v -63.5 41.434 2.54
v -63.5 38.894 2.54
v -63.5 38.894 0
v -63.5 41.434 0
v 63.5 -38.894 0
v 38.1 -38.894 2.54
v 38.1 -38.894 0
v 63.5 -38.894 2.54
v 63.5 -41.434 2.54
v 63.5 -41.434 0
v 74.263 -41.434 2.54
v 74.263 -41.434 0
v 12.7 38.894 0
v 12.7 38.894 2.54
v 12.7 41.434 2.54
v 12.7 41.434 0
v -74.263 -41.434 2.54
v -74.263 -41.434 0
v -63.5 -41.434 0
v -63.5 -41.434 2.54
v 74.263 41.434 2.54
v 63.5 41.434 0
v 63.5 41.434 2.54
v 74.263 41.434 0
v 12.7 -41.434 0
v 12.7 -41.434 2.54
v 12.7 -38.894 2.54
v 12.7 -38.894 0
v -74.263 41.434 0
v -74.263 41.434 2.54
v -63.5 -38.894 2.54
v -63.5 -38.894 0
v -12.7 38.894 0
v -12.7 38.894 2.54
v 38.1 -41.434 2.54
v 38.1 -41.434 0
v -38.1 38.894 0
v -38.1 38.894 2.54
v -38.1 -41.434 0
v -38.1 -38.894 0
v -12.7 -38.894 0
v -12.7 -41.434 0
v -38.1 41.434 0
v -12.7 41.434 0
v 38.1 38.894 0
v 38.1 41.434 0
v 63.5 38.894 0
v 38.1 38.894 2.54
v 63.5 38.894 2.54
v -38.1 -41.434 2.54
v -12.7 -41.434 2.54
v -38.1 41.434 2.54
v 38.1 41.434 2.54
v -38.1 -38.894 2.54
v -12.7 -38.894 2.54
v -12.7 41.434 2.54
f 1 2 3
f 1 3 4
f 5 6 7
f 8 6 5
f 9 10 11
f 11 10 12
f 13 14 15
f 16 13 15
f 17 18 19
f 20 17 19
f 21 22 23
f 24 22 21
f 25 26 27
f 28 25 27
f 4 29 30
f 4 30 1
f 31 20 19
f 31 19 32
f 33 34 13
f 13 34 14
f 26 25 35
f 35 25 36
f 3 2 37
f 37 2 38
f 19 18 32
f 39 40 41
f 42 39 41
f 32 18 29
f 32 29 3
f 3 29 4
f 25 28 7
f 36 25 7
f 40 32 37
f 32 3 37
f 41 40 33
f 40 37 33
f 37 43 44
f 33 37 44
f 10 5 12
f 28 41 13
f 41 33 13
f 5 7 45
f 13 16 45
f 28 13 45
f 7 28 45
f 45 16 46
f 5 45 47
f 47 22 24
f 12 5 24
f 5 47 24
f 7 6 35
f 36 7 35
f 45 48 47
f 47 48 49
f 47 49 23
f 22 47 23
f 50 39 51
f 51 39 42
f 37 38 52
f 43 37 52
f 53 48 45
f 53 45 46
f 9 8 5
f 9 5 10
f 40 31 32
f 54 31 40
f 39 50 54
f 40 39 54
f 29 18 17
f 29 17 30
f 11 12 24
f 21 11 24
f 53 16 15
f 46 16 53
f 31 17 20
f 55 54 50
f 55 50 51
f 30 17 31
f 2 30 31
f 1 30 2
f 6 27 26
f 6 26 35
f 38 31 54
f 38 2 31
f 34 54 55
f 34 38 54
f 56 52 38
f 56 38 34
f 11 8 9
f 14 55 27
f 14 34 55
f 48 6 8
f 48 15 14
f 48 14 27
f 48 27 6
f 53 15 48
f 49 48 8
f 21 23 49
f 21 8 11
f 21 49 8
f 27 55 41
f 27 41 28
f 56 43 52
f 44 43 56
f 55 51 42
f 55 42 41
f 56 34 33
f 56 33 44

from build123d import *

# Parameters (mm, degrees)
SKETCH1_W               = 148.5265
SKETCH1_H               = 82.8675
BOSS_EXTRUDE1_DEPTH     = 2.54
SKETCH2_W               = 25.4
SKETCH2_H               = 2.54
CUT_EXTRUDE1_DEPTH      = 86.077832246
LPATTERN1_COUNT         = 3
LPATTERN1_PITCH         = 50.8
MIRROR1_COPY_1_SKETCH_W = 25.4
MIRROR1_COPY_1_SKETCH_H = 2.54
MIRROR1_COPY_1_DEPTH    = 86.077832246
MIRROR1_COPY_2_SKETCH_W = 25.4
MIRROR1_COPY_2_SKETCH_H = 2.54
MIRROR1_COPY_2_DEPTH    = 86.077832246


with BuildPart() as part:
    # Sketch1 → Boss-Extrude1 (new body)
    with BuildSketch(Plane.XY):
        Rectangle(SKETCH1_W, SKETCH1_H)
    extrude(amount=BOSS_EXTRUDE1_DEPTH)

    # Sketch2 → Cut-Extrude1 (cut, through all)
    with BuildSketch(Plane.XY.offset(2.54)):
        with Locations((50.8, 40.16375)):
            Rectangle(SKETCH2_W, SKETCH2_H)
    cut_extrude1 = extrude(amount=-CUT_EXTRUDE1_DEPTH, mode=Mode.SUBTRACT)

    # LPattern1: Cut-Extrude1 ×3
    with Locations(*[(-i * LPATTERN1_PITCH, 0, 0) for i in range(1, LPATTERN1_COUNT)]):
        add(cut_extrude1, mode=Mode.SUBTRACT)

    # Mirror1: Cut-Extrude1 across plane
    add(cut_extrude1.mirror(Plane.ZX), mode=Mode.SUBTRACT)

    # Mirror1 copy 1 sketch → Mirror1 copy 1 (cut, through all)
    with BuildSketch(Plane(origin=(-50.8, 0, 2.54), x_dir=(1, 0, 0), z_dir=(0, 0, 1))):
        with Locations((50.8, -40.16375)):
            Rectangle(MIRROR1_COPY_1_SKETCH_W, MIRROR1_COPY_1_SKETCH_H)
    extrude(amount=-MIRROR1_COPY_1_DEPTH, mode=Mode.SUBTRACT)

    # Mirror1 copy 2 sketch → Mirror1 copy 2 (cut, through all)
    with BuildSketch(Plane(origin=(-101.6, 0, 2.54), x_dir=(1, 0, 0), z_dir=(0, 0, 1))):
        with Locations((50.8, -40.16375)):
            Rectangle(MIRROR1_COPY_2_SKETCH_W, MIRROR1_COPY_2_SKETCH_H)
    extrude(amount=-MIRROR1_COPY_2_DEPTH, mode=Mode.SUBTRACT)


solid = part.part
